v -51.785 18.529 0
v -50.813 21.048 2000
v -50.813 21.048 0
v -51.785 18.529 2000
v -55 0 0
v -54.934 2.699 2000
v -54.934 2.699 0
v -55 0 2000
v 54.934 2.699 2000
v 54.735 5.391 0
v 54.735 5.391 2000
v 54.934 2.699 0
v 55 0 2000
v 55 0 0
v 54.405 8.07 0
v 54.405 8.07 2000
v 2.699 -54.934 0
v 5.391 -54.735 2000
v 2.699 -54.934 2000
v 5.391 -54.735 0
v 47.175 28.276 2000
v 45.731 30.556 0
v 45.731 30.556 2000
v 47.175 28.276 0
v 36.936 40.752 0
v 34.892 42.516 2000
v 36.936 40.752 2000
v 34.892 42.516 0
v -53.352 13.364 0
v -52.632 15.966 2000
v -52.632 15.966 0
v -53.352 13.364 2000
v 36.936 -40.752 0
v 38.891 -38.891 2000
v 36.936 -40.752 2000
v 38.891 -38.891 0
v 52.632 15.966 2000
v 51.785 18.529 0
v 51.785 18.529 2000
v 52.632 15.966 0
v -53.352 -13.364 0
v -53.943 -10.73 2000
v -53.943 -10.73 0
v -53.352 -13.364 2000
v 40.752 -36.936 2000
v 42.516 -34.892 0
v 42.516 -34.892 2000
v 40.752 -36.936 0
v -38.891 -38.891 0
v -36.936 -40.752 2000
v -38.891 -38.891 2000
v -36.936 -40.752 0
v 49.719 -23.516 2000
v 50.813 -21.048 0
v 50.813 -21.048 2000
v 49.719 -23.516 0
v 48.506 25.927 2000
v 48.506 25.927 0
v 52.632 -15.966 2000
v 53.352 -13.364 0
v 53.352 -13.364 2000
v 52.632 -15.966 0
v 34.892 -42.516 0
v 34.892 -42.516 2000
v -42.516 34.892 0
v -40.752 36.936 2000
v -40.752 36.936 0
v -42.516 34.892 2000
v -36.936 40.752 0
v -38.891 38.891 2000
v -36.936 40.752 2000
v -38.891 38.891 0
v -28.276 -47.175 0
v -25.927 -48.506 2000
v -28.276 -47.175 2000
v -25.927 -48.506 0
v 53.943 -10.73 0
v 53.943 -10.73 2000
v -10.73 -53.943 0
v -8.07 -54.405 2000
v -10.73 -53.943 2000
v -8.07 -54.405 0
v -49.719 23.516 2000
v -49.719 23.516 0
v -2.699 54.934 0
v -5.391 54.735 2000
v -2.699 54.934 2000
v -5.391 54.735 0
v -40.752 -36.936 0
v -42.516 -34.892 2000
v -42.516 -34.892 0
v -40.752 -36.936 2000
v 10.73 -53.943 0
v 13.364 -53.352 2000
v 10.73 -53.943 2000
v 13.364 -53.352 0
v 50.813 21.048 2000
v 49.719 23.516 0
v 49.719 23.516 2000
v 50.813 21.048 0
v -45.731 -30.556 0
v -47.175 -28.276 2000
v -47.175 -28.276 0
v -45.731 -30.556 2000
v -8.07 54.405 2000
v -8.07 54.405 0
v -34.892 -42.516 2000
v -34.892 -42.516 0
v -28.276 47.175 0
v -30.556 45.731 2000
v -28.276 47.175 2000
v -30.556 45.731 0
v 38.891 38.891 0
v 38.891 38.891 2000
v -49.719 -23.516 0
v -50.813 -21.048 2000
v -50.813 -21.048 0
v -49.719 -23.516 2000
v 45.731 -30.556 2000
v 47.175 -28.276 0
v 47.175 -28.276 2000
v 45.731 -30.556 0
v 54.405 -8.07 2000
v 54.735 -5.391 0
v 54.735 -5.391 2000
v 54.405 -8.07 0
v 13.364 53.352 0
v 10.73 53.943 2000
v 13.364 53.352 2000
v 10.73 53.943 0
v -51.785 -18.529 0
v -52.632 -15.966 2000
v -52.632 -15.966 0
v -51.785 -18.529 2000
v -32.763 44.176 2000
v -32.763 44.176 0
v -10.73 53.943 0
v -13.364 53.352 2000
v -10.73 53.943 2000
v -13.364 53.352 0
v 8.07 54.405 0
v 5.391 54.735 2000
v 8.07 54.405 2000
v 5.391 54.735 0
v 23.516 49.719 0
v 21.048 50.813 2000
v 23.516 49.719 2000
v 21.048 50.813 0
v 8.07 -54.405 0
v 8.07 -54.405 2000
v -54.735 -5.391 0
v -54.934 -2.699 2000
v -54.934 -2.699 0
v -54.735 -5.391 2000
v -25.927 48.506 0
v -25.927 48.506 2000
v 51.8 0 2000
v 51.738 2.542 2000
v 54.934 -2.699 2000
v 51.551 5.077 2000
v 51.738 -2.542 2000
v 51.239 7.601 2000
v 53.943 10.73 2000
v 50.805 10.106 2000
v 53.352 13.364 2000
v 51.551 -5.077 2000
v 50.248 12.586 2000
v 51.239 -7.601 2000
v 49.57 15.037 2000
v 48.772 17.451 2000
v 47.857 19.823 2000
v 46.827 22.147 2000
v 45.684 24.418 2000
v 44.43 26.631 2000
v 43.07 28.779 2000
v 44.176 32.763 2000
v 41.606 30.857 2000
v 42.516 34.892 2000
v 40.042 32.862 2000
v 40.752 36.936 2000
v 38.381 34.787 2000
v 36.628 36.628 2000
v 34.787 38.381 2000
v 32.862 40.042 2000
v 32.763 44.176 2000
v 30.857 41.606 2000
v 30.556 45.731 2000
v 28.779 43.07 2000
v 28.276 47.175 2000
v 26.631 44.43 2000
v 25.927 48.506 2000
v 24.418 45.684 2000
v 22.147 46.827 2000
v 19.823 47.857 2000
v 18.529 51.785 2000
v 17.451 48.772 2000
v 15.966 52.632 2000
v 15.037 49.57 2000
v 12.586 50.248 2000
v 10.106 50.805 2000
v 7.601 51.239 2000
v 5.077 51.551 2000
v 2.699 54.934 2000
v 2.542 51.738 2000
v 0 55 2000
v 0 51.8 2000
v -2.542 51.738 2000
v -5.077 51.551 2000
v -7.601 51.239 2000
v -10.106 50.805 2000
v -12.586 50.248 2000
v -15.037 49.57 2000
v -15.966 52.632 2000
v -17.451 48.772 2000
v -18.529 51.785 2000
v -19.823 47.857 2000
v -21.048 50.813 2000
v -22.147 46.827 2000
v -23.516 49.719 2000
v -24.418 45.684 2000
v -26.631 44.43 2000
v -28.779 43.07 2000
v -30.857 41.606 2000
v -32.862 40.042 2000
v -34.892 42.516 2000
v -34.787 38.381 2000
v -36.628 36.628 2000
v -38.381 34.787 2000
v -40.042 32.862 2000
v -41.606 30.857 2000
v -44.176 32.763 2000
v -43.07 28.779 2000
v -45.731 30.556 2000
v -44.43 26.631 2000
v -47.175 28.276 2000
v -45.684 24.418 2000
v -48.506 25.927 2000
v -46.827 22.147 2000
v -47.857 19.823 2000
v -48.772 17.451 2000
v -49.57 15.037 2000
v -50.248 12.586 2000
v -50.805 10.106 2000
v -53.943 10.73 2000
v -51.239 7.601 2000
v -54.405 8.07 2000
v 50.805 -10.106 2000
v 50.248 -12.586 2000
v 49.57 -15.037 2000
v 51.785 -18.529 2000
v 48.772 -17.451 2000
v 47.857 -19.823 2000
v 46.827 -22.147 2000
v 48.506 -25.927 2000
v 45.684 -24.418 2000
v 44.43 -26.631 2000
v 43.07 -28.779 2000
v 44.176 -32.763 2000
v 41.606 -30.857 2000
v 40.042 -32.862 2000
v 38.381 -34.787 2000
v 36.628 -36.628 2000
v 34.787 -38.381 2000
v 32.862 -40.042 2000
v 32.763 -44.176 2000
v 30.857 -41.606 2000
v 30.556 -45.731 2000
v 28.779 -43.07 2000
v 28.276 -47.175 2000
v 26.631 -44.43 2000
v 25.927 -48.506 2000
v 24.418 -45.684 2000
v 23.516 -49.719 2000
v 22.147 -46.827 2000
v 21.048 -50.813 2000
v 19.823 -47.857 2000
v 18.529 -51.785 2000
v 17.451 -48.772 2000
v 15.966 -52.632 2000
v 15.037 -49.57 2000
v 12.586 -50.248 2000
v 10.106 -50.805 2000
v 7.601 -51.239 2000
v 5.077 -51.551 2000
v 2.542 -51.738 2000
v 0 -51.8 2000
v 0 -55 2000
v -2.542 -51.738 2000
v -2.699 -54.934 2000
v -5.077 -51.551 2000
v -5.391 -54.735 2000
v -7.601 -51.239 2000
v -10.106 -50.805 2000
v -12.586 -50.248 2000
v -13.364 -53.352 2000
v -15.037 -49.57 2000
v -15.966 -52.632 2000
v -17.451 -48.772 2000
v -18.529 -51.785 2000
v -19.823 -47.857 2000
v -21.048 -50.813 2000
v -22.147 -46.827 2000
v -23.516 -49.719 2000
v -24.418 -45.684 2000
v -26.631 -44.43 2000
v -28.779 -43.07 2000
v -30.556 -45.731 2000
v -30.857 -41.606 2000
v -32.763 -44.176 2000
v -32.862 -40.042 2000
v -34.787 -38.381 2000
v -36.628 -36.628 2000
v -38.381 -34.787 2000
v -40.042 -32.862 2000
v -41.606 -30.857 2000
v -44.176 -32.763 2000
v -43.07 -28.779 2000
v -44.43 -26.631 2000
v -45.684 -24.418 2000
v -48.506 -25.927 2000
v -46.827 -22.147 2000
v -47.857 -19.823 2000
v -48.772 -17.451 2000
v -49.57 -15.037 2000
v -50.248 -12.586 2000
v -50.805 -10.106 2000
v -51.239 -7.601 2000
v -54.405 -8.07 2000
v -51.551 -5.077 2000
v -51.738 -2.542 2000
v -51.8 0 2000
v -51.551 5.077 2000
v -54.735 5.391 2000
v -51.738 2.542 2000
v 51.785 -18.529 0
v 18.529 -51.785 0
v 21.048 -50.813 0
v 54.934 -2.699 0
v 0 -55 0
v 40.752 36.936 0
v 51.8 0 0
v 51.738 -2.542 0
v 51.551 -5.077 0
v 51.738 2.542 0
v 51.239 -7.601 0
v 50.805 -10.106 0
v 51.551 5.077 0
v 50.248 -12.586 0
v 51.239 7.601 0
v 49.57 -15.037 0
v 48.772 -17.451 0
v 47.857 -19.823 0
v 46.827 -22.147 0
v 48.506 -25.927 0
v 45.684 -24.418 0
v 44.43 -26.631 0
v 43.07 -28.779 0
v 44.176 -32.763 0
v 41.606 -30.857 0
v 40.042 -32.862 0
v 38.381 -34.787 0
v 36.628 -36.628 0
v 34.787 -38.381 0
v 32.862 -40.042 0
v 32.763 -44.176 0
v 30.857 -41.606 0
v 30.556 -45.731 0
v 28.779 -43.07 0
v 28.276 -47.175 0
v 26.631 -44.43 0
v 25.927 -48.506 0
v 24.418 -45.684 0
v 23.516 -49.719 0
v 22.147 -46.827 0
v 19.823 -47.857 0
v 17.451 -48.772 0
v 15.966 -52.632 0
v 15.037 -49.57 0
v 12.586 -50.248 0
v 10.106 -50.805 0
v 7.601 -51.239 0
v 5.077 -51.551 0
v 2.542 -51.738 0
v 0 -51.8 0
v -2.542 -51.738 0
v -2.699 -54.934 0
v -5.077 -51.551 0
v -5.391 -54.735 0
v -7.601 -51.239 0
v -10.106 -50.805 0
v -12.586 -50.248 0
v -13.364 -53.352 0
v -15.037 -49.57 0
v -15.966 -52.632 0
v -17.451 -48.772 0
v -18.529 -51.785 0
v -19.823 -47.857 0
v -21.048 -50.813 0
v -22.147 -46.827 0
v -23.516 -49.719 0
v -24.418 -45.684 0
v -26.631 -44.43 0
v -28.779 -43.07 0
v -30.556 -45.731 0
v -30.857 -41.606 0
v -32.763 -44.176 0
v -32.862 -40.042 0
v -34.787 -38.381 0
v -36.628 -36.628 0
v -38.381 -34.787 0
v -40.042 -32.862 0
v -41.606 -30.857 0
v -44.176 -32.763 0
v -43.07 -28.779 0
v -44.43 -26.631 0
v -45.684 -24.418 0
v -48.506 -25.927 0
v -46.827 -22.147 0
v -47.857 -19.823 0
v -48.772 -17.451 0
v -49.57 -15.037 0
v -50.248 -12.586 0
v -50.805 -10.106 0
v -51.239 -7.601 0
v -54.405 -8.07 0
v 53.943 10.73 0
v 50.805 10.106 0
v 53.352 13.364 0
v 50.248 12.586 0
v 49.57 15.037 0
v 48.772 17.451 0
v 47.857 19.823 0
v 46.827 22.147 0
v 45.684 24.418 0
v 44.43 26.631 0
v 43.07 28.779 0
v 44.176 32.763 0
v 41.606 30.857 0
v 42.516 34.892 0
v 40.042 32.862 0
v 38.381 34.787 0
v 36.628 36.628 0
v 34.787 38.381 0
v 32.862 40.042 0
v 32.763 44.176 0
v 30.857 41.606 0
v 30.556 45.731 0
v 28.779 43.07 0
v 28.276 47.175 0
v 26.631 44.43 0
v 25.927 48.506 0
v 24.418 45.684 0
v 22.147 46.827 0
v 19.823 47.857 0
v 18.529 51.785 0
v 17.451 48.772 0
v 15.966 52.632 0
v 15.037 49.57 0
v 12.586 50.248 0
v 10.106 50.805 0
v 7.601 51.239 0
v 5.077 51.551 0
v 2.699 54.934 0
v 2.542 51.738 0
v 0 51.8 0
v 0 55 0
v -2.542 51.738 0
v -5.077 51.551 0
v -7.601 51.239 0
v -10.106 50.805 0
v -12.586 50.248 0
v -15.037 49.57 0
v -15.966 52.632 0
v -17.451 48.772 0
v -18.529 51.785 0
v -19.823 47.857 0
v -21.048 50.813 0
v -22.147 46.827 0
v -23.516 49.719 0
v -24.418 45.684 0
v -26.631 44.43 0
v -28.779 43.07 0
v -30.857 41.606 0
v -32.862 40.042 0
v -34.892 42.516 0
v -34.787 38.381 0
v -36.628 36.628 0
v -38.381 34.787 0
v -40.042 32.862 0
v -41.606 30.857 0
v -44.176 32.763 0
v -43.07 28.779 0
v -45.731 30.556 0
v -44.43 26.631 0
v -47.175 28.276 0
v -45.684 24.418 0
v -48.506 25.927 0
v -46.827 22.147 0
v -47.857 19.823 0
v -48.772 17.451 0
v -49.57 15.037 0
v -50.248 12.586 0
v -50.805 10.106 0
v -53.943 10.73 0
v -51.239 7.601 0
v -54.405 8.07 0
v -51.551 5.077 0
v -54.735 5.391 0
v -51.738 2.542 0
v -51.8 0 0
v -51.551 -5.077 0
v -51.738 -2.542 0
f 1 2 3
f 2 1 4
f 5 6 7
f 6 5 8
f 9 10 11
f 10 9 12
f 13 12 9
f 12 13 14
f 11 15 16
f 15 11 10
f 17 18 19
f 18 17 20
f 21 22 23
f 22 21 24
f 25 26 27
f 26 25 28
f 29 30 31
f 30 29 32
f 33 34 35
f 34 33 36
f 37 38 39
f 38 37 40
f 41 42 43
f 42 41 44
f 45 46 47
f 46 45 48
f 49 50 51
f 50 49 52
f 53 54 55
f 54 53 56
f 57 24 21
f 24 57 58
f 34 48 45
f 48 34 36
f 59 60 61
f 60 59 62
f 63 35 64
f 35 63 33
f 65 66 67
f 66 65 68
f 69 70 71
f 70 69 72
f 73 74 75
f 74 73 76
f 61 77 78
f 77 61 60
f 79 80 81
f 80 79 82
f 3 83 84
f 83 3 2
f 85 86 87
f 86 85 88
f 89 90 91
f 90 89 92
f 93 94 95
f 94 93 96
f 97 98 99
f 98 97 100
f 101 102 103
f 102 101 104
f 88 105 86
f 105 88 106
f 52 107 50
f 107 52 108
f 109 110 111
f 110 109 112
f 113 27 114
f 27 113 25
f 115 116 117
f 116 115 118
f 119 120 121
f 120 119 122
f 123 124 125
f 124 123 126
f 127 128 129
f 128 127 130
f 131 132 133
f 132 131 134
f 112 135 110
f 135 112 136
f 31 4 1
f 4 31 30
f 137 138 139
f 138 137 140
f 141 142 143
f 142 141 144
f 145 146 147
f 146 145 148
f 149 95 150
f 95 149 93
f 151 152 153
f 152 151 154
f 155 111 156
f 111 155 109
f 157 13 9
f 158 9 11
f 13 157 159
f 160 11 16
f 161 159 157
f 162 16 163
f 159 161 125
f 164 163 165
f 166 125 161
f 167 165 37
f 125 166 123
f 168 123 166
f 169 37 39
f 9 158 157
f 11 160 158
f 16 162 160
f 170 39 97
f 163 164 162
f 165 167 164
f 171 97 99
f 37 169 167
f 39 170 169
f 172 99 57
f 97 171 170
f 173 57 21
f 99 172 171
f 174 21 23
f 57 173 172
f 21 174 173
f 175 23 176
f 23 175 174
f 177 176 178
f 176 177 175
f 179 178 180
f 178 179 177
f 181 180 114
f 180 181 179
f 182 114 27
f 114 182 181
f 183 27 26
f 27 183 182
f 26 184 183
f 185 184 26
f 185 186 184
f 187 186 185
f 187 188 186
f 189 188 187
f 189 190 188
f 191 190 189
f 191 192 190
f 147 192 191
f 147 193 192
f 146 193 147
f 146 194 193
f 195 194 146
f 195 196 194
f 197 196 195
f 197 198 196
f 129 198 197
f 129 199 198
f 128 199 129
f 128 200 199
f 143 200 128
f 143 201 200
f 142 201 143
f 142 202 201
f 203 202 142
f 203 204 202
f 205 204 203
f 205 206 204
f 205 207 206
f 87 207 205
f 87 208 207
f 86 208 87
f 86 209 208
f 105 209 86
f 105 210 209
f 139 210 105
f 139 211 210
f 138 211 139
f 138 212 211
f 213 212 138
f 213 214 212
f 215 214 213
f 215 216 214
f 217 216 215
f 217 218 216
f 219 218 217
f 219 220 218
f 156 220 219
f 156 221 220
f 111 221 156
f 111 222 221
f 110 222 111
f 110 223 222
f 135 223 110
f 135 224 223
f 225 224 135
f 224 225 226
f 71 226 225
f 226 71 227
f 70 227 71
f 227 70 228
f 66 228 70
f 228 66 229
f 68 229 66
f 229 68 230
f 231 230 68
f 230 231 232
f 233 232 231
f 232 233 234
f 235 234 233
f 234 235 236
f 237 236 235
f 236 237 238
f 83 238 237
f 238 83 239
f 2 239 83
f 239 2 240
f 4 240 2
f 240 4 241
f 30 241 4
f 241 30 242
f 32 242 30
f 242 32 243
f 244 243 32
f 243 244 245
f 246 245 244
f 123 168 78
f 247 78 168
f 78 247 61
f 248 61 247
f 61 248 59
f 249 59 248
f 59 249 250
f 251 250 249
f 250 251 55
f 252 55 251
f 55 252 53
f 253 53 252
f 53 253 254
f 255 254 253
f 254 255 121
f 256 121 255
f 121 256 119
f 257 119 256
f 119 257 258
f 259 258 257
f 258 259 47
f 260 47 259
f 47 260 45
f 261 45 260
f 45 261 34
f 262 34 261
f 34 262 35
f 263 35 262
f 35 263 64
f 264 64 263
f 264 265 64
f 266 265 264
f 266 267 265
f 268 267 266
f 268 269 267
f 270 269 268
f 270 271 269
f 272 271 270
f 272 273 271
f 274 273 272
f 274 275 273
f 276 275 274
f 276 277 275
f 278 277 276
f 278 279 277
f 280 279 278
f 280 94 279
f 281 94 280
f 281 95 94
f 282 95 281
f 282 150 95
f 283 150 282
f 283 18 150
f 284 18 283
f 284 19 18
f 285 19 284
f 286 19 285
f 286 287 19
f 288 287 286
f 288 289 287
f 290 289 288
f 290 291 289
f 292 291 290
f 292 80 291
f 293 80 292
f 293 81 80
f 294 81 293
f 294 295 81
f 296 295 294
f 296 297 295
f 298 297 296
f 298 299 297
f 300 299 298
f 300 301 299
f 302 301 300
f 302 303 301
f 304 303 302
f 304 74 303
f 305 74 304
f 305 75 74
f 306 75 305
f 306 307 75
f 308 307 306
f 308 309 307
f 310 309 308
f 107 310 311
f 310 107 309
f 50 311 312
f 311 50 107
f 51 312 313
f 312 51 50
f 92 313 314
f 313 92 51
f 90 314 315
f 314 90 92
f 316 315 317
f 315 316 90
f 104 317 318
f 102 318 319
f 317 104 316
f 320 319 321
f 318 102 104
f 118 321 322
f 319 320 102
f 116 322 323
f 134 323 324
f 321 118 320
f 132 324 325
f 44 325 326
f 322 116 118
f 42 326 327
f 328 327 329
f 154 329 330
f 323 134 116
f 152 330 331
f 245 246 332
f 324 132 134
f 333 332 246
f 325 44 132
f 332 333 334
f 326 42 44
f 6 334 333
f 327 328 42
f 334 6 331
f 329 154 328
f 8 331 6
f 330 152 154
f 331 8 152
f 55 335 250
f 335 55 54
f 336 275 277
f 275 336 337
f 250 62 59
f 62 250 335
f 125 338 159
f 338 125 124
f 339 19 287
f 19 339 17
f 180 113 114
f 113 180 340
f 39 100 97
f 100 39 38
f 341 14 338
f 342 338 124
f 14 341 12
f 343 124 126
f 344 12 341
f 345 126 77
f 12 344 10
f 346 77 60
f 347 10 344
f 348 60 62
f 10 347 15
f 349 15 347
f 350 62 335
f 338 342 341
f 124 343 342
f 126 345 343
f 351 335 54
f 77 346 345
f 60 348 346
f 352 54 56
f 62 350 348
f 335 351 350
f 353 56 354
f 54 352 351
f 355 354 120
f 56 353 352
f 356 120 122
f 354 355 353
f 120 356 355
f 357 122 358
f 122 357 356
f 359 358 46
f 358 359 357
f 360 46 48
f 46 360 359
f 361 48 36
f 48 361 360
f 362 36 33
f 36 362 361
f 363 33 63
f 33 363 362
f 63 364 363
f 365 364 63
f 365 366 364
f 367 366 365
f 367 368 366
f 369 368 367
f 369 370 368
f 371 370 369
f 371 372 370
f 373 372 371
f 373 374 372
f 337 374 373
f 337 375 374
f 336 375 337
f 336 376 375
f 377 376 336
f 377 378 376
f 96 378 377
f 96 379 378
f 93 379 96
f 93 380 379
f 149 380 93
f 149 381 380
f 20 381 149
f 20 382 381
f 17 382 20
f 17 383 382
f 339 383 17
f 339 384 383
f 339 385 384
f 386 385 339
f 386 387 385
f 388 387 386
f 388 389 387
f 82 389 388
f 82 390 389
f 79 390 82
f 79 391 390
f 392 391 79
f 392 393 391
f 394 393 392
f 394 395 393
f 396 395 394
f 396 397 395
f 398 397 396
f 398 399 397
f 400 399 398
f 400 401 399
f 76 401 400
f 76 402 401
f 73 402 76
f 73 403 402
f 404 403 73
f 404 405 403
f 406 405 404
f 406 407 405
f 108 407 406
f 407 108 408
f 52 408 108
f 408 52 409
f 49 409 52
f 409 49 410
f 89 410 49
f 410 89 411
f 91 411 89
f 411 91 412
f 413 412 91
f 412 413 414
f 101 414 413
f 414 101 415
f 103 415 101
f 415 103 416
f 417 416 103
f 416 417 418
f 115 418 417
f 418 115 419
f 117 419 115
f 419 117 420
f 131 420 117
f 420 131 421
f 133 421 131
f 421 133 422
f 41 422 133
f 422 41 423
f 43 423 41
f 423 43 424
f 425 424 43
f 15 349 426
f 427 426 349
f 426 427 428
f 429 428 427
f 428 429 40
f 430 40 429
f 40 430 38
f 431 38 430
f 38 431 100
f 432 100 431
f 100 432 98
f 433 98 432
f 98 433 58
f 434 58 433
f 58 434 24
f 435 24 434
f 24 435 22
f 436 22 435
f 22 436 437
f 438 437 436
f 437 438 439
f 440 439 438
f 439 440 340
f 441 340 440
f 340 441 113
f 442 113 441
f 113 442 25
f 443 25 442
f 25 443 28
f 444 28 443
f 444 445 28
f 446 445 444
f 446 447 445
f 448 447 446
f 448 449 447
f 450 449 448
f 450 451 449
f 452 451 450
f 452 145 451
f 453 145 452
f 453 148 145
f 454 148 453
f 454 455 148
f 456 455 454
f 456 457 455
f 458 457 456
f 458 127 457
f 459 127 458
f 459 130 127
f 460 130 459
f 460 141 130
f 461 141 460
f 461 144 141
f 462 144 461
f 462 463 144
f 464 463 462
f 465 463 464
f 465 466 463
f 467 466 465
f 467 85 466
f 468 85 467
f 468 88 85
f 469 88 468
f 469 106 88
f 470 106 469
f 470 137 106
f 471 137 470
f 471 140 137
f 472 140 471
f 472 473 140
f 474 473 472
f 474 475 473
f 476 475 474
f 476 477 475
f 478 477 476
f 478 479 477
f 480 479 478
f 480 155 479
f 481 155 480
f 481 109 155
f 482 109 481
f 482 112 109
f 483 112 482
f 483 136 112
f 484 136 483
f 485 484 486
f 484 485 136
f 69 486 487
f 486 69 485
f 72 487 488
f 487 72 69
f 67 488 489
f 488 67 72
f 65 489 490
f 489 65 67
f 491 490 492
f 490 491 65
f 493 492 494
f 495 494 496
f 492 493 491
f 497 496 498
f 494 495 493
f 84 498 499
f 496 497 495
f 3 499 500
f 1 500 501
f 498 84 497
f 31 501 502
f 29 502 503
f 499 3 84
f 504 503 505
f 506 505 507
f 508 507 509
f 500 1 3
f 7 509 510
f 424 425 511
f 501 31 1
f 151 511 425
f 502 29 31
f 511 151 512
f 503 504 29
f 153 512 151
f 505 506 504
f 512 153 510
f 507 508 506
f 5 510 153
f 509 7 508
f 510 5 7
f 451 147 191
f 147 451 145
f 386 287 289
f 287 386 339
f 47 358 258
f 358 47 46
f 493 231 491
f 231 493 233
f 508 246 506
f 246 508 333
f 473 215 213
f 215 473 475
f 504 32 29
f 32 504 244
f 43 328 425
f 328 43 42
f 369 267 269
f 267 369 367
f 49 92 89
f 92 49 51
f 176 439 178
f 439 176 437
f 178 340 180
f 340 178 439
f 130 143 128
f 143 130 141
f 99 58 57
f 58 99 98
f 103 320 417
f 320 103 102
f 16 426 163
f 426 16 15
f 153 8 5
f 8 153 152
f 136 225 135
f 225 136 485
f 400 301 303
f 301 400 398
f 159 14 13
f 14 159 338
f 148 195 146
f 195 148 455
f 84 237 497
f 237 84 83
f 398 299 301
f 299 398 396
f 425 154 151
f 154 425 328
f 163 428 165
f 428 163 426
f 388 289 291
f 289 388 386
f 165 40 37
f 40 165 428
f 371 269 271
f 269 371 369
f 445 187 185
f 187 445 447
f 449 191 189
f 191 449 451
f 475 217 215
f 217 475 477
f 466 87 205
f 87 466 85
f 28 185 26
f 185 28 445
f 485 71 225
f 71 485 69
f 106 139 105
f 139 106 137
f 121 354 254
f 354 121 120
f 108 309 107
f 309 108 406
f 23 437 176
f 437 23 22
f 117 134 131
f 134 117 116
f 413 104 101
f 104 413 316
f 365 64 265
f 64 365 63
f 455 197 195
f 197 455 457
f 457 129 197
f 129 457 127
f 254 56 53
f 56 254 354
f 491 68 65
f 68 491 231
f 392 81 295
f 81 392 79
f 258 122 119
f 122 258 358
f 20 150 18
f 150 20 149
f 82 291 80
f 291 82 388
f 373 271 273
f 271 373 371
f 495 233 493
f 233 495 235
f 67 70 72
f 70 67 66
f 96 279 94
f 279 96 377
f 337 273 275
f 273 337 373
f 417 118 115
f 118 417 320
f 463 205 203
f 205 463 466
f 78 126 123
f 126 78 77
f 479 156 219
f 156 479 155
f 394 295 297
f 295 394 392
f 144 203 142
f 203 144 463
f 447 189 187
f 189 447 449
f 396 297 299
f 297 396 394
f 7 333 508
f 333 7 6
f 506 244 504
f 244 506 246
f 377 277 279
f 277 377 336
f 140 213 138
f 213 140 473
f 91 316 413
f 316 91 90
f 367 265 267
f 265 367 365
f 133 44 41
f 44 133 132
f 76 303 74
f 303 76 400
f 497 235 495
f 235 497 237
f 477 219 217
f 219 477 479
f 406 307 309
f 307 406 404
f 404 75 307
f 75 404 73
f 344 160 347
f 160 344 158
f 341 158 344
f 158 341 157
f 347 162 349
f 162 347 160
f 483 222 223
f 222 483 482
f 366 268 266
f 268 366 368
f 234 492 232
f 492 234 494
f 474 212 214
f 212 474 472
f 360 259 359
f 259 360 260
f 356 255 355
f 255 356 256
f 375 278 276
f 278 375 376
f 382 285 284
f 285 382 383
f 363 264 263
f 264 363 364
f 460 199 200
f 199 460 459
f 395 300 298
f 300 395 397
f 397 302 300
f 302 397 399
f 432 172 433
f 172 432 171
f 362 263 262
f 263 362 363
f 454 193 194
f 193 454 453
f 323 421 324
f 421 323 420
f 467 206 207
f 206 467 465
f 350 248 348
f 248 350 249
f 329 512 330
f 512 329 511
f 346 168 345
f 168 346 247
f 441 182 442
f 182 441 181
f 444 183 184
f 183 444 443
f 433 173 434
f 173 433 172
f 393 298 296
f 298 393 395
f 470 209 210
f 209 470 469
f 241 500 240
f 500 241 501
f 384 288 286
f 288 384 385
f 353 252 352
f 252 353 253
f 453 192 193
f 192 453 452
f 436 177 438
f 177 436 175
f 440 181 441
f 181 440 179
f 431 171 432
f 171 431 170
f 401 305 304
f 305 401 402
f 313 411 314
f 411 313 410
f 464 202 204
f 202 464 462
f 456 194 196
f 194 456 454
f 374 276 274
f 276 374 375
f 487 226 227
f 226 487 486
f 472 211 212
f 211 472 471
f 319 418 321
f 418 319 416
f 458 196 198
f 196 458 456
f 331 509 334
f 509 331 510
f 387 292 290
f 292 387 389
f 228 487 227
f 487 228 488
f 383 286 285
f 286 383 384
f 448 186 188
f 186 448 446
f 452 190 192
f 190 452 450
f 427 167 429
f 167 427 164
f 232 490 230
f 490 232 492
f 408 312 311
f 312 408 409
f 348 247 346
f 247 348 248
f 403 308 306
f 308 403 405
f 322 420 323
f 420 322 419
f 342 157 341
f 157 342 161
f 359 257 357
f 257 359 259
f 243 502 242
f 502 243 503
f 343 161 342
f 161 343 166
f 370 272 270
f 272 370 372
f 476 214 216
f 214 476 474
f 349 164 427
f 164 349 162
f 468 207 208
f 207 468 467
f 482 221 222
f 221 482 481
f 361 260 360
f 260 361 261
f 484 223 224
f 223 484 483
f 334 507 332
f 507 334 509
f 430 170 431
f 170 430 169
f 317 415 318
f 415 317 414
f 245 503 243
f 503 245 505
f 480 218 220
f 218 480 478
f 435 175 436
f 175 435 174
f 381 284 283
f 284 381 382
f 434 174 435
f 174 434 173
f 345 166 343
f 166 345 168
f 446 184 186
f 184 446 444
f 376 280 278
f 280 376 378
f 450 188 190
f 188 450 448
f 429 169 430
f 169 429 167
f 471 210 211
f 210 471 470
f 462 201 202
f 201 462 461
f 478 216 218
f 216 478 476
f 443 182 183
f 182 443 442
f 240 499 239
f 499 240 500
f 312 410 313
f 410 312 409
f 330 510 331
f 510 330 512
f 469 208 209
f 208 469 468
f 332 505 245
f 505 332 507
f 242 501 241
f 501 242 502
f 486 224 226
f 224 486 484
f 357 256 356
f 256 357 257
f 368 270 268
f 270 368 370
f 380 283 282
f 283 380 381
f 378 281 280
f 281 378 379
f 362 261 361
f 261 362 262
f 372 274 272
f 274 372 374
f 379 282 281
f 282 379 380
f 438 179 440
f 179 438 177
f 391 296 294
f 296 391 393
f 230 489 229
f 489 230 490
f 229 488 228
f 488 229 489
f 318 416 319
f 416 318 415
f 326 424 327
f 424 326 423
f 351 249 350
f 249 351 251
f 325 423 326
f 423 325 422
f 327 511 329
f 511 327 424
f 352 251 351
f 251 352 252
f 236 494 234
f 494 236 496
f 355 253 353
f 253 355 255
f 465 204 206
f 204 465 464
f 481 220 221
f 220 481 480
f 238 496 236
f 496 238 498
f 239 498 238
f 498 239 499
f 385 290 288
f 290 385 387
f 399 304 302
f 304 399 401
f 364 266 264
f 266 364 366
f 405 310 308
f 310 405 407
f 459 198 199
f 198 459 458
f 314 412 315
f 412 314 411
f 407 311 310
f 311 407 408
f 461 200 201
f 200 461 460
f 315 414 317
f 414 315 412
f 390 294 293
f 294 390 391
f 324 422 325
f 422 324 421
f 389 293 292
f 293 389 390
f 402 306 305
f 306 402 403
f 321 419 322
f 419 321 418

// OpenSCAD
$fn = 128;

// HT pipe parameters (approximate for HT 110)
pipe_length = 2000;          // mm
outer_diameter = 110;        // mm (nominal HT 110)
wall_thickness = 3.2;        // mm (typical for HT indoor drainage)
inner_diameter = outer_diameter - 2*wall_thickness;

module ht_pipe(od, id, len) {
    difference() {
        cylinder(h = len, d = od, center = false);
        translate([0,0,-0.1])
            cylinder(h = len + 0.2, d = id, center = false);
    }
}

ht_pipe(outer_diameter, inner_diameter, pipe_length);
